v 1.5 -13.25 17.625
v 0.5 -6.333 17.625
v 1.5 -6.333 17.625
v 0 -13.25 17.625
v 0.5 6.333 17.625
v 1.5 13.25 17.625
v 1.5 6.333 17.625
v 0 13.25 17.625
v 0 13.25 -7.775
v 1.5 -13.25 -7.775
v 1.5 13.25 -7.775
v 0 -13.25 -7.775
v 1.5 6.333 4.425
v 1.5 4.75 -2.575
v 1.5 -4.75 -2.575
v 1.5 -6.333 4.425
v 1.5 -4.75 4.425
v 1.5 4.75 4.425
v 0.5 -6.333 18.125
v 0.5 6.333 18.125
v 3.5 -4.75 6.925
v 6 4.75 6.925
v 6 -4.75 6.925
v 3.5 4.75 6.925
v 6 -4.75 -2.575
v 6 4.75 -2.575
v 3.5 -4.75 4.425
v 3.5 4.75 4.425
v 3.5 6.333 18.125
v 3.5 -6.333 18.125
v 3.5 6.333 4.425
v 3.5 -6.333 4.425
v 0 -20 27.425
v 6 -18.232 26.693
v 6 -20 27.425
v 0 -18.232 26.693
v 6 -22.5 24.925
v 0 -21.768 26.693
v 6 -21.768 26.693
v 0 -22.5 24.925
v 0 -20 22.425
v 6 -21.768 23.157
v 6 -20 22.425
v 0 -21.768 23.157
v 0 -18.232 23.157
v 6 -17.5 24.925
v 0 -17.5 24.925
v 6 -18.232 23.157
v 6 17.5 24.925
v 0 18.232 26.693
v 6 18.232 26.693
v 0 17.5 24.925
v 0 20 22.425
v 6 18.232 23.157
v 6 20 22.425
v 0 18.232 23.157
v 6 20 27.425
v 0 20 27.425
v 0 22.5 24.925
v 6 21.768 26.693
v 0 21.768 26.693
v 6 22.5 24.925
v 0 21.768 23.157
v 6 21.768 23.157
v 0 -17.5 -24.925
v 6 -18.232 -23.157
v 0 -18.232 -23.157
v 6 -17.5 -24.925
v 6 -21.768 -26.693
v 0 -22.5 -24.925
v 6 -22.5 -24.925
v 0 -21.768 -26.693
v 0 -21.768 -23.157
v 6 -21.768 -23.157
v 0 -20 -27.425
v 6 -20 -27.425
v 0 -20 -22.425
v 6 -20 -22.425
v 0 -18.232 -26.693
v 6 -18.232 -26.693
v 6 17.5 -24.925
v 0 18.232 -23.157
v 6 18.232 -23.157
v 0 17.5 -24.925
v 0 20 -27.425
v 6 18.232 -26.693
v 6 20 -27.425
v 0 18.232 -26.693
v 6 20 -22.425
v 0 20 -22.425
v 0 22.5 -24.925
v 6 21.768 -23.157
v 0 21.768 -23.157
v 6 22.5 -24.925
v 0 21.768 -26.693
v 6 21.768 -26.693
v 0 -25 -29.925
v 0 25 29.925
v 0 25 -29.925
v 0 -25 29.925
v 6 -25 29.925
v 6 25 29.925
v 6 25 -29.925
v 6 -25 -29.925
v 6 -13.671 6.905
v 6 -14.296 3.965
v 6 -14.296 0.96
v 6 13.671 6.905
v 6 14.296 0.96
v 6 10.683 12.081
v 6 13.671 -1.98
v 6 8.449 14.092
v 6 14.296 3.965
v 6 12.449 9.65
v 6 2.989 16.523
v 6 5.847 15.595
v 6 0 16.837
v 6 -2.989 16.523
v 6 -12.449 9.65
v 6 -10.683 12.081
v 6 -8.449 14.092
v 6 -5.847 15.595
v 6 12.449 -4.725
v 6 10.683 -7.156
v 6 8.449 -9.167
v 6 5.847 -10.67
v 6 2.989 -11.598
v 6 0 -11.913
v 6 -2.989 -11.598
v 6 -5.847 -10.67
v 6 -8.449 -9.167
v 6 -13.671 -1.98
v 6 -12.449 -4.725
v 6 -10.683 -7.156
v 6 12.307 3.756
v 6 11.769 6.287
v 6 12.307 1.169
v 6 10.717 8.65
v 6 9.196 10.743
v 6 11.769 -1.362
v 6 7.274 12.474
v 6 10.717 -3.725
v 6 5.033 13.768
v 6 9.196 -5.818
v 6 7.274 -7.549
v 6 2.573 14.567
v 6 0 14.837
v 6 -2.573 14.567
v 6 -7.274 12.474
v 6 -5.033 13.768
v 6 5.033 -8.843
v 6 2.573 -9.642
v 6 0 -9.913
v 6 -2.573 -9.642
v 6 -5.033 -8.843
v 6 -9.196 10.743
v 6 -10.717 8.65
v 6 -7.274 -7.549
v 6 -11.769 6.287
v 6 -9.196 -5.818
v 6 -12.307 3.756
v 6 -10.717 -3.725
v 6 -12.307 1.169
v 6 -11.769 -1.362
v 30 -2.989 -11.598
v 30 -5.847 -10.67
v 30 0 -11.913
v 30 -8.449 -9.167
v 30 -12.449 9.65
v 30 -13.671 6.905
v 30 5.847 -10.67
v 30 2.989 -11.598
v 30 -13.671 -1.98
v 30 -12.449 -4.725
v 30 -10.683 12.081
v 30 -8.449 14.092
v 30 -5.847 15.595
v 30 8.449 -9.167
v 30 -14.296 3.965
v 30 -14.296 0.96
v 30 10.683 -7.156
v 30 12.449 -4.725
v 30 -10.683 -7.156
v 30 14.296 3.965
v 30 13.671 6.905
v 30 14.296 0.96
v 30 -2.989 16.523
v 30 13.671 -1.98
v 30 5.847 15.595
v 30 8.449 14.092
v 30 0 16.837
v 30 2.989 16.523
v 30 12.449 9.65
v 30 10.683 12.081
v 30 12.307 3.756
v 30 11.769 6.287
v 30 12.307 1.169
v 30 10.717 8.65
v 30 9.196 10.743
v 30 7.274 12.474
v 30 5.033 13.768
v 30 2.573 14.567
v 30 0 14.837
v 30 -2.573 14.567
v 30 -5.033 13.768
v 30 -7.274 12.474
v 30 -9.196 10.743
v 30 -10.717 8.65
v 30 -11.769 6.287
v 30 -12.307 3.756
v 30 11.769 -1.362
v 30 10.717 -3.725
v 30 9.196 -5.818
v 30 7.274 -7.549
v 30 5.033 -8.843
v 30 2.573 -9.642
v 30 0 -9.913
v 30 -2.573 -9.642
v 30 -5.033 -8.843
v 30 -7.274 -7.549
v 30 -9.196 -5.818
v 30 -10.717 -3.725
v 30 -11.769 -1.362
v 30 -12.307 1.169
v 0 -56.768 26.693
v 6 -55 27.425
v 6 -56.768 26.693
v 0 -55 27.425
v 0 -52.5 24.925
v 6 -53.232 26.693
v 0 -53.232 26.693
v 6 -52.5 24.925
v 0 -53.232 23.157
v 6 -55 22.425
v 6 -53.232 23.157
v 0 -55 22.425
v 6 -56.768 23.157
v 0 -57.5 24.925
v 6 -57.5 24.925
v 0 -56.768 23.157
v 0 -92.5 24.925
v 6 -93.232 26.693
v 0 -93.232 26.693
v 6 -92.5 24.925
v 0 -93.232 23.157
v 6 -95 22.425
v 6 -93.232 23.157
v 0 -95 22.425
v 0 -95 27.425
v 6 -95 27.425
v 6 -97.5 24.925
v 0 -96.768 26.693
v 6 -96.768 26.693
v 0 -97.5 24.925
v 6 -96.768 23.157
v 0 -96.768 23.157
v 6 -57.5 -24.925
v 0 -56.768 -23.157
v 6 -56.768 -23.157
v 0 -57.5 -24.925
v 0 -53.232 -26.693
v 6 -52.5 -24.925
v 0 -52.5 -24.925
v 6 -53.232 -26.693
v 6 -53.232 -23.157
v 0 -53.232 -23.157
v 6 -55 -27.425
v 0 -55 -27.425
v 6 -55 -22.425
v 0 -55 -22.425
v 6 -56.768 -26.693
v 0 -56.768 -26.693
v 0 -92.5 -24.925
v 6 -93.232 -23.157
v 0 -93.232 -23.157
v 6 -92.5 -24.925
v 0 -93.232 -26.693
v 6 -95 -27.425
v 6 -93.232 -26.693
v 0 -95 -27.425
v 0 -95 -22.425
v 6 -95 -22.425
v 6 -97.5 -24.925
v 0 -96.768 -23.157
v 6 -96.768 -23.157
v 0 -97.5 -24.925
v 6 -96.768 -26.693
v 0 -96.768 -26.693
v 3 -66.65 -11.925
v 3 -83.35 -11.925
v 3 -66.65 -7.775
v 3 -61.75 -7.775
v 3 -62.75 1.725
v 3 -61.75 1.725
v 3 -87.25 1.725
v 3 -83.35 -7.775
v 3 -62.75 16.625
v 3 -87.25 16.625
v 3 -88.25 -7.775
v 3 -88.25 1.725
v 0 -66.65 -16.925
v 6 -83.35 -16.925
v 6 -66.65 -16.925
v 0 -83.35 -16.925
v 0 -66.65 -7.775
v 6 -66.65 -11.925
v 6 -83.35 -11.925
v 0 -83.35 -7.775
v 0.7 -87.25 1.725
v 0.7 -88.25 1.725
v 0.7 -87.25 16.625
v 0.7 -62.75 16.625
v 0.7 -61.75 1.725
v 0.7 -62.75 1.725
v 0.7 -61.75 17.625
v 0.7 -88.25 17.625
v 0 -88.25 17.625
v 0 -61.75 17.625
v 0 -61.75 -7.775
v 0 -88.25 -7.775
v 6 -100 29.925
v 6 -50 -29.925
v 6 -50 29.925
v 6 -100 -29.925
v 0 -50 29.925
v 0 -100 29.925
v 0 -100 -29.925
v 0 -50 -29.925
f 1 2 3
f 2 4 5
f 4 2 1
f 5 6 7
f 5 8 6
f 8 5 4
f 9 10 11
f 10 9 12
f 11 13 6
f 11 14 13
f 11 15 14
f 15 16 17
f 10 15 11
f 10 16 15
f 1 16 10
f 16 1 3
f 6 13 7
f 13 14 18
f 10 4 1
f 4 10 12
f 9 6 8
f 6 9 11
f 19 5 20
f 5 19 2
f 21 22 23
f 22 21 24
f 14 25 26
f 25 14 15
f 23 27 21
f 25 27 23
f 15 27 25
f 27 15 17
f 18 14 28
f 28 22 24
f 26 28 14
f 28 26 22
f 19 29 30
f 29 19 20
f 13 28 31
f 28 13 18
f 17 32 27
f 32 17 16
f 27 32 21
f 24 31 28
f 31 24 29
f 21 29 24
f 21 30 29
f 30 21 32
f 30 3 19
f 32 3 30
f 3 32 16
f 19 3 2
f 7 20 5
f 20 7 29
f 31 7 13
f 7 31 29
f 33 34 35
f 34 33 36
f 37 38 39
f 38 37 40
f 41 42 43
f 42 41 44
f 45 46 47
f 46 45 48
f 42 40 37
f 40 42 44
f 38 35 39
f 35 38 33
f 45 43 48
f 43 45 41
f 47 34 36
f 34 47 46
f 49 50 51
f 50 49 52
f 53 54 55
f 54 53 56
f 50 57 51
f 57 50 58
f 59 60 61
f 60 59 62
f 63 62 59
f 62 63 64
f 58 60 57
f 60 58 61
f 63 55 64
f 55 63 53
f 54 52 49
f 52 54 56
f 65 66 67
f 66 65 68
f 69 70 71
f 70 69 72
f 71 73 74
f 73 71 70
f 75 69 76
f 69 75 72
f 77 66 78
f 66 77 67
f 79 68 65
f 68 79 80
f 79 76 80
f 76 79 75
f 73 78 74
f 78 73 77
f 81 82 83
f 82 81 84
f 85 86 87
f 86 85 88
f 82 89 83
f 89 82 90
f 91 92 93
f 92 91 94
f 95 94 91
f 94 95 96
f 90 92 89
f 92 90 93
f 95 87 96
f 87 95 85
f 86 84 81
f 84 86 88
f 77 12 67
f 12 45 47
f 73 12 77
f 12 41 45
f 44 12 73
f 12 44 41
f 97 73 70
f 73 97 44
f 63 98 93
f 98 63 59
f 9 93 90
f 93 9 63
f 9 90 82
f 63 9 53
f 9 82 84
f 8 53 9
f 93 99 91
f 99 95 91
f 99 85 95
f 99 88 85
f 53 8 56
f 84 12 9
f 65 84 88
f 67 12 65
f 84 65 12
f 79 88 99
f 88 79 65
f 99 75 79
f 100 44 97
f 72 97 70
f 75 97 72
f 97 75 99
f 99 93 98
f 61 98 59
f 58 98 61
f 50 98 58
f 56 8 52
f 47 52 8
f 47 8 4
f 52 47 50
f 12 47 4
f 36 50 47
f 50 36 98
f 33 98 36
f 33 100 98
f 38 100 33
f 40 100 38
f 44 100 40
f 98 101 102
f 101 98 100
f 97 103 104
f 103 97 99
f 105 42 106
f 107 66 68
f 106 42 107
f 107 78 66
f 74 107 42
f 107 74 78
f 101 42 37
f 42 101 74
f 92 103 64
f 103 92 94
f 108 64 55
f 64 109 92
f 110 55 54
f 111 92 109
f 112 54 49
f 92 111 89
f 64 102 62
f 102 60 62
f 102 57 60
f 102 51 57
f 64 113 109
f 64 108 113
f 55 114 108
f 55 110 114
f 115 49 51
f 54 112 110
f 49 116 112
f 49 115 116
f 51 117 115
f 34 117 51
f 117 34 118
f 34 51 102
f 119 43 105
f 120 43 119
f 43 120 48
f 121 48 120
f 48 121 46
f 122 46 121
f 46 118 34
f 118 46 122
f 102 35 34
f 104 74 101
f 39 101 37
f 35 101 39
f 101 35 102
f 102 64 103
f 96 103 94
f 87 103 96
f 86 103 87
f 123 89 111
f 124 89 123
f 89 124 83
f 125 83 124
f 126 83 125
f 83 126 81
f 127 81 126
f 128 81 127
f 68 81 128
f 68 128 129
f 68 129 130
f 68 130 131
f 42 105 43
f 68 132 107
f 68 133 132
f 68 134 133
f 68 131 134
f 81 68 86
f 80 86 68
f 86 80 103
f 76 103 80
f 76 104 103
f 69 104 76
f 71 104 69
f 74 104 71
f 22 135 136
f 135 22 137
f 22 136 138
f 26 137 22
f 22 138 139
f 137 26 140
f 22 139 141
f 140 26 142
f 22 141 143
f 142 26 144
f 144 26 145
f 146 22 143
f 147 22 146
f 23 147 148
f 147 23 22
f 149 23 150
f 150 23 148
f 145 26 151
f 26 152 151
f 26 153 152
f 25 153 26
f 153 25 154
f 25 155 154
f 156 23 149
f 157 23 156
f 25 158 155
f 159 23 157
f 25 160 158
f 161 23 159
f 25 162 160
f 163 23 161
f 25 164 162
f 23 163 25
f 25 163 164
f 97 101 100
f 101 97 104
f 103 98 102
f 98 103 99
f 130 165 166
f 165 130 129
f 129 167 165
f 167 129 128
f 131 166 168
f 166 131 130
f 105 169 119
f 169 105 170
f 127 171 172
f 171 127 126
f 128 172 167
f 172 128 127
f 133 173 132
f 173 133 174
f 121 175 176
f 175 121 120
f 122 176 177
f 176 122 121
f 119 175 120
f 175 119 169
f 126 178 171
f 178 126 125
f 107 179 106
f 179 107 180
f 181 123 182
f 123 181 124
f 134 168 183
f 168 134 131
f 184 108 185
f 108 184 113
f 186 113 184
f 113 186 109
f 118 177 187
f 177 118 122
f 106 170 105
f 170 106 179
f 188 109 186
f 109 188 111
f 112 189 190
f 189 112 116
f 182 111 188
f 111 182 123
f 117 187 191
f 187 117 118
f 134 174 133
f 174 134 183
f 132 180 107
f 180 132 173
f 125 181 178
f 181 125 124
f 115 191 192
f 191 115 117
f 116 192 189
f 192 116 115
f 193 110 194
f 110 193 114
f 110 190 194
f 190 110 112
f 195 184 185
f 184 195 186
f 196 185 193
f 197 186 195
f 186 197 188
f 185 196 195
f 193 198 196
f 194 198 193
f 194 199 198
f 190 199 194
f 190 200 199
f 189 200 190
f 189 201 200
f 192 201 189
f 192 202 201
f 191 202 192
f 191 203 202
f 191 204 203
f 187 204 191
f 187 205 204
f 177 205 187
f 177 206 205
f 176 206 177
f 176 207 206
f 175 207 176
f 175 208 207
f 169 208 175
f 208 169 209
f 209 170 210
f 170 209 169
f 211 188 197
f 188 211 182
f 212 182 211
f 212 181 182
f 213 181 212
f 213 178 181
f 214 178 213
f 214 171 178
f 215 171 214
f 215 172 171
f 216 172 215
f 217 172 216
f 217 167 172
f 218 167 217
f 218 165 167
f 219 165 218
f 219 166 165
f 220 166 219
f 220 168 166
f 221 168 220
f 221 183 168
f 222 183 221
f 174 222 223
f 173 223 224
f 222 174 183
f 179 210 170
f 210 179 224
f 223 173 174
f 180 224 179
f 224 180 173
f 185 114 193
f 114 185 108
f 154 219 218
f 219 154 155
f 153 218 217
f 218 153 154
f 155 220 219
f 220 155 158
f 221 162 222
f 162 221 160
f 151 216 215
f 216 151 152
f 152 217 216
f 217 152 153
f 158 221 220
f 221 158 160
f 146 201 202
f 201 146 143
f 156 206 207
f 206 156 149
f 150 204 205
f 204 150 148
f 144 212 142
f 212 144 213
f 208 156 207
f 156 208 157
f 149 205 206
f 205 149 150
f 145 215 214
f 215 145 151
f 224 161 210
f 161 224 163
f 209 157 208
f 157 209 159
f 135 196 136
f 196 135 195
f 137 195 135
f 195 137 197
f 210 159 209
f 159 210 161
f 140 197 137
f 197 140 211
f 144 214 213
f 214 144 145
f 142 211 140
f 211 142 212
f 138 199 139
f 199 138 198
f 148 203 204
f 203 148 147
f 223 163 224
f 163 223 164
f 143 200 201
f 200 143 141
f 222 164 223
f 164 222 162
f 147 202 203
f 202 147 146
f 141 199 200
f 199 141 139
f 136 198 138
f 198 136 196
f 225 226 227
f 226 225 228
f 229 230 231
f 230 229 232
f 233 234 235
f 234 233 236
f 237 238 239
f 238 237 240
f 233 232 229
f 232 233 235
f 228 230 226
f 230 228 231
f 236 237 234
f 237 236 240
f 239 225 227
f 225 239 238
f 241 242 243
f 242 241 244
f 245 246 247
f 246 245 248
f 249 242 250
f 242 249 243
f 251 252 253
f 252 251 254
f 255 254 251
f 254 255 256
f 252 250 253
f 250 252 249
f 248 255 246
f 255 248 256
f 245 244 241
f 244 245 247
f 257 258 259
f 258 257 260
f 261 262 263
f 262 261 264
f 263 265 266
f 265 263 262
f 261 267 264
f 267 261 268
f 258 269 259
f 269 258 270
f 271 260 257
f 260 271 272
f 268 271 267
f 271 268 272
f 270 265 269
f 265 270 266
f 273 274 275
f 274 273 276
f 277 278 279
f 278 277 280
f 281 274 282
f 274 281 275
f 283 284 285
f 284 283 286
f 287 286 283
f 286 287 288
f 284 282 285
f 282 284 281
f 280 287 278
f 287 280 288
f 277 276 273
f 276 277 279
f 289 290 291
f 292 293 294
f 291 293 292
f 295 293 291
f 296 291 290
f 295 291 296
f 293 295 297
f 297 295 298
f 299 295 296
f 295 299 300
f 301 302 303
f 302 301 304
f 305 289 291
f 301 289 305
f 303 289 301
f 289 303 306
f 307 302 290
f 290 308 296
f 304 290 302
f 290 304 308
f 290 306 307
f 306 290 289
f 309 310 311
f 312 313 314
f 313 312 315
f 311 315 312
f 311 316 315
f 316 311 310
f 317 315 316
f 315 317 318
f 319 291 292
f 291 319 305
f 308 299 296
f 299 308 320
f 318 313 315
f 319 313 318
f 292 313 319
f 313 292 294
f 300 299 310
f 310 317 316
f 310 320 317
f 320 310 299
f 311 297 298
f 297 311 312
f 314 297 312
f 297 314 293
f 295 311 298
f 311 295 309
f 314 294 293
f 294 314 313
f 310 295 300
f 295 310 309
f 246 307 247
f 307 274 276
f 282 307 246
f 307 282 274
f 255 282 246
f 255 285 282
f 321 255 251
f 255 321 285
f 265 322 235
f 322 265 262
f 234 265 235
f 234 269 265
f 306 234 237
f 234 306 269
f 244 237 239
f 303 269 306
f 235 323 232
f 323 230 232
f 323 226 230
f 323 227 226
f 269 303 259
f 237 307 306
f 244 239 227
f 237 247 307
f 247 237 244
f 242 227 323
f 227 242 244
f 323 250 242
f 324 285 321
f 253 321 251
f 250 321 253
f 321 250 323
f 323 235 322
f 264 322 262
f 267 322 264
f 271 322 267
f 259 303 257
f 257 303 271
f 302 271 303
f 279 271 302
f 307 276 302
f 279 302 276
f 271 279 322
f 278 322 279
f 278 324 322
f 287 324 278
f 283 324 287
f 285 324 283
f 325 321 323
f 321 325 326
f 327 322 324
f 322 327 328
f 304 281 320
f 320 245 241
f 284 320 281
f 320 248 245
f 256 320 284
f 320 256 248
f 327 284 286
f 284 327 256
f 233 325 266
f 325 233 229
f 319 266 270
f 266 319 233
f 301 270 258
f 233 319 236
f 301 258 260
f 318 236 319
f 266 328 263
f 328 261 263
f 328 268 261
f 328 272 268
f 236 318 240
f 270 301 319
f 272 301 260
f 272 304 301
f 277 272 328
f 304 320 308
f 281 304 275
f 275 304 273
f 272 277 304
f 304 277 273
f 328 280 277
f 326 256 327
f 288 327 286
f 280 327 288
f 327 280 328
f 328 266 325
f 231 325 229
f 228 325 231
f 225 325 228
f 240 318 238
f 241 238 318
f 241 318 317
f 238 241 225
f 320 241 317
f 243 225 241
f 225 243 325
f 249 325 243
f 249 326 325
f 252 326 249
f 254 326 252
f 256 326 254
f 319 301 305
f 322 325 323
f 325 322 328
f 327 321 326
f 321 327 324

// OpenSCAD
// file: PiCameraMount.scad
/*
 * openSCAD for a simple mount for the Raspberry PI Camera Module
 *
 * This file is not for standalone use - it's included in to another
 * openSCAN file for including in to another model.
 *
 * Copyright 2015 Peter T Mount
 * 
 * Licensed under the Apache License, Version 2.0 (the "License");
 * you may not use this file except in compliance with the License.
 * You may obtain a copy of the License at
 * 
 * http://www.apache.org/licenses/LICENSE-2.0
 * 
 * Unless required by applicable law or agreed to in writing, software
 * distributed under the License is distributed on an "AS IS" BASIS,
 * WITHOUT WARRANTIES OR CONDITIONS OF ANY KIND, either express or implied.
 * See the License for the specific language governing permissions and
 * limitations under the License.
 *
 */

// Uncomment this line to render/print just the holder as-is.
// Leave it commented out so that this file can be included in other modules
//piCameraStandalone(50);

/*
 * Measured dimensions of a PI Camera Module.
 *
 * These are based on actual measurements and those manually measured by Gert van Loo
 * and published on Scribd:
 *
 *		http://www.scribd.com/doc/142718448/Raspberry-Pi-Camera-Mechanical-Data
 *
 * Width & Depth are the exterior dimensions, width being the edge with the ribbon.
 *
 * We add 1.5 to these to give some room and account for the printer as it seems
 * to give a better fit.
 *
 * y offset is the height from the bottom of the center of the camera lens.
 *
 * ribbon width is just that, if required
 */
piCameraWidth=25 +1.5;
piCameraDepth=23.9 +1.5;
piCameraRibbonWidth=16.2 +0.5;
piCameraLensSize=8 +1.5;
piCameraYOffset=5.1+(piCameraLensSize/2);

/*
 * Module to render a PI camera mount.
 *
 * To use translate it into the required position so that the camera lens
 * is at the origin & pointing along the x axis.
 *
 * Then call piCameraMount(radius,mode)
 *
 * Where:
 *		width	the width of the component
 *		mode	The mode of the render
 *
 * The width must be >30mm as it's used to include the mounting hardware.
 * However you can enlarge it.
 *
 * The mode defines how it's rendered:
 *		0	Render the front panel
 *		1	Render the back panel
 *		2	Render a plain panel with just the mounting holes
 *    3	As 1 but cable exit on back is internal rather than at the bottom of the plate
 */

module piCamera(width,mode) {
	assign(
		tubeRadius=width/2,
		piCameraLensHalf=piCameraLensSize/2,
		piCameraWHalf=piCameraWidth/2,
		piCameraDHalf=piCameraDepth/2,
		offset=piCameraYOffset
	) {
		translate([0,0,piCameraYOffset/2]) union() {
			// Front panel
			difference() {
				if(mode==1 || mode==3)
					translate([6,-tubeRadius,-tubeRadius-offset]) cube([6,width,width+offset]);
				else
					translate([0,-tubeRadius,-tubeRadius-offset]) cube([6,width,width+offset]);

//				translate([4,-tubeRadius-1,-tubeRadius-offset-1]) cube([2,width+2,width+offset+2]);

				if(mode!=2) {
					// Holder for the pi camera module
					translate([4.5,-piCameraWHalf,-piCameraDHalf])
						cube([2.2,piCameraWidth,piCameraDepth]);

					// Holder for components on rear of module
					translate([6,1-piCameraWHalf,1-piCameraDHalf])
						cube([3,piCameraWidth-2,piCameraDepth-2]);
					translate([6,-piCameraWHalf,-piCameraDHalf])
						cube([3,piCameraWidth,9.5]);

					// Hole for the camera lens
					translate([-0.5,-piCameraLensHalf,2-piCameraLensSize])
						cube([6,piCameraLensSize,piCameraLensSize]);

					// Indent for ribbon holder on front of the module
					translate([2.5,-piCameraLensSize*2/3,-0.5])
						cube([3,piCameraLensSize*4/3,piCameraDHalf+1]);
		
					// Space for ribbon cable
					if(mode==1)
						translate([ 5, -piCameraRibbonWidth/2,-tubeRadius-1-offset])
							cube([3,piCameraRibbonWidth,tubeRadius+1+offset]);
					else if(mode==3) {
						translate([ 5, -piCameraRibbonWidth/2,14-tubeRadius-1-offset])
							cube([4,piCameraRibbonWidth,15]);
						translate([ 5, -piCameraRibbonWidth/2,14-tubeRadius-1-offset])
							cube([10,piCameraRibbonWidth,5]);
					}
				}

				// M4 mounting holes
				piCameraHoles(width,15);
			}
		}

	}
}

module piCameraHoles(width,h) {
	assign(tubeRadius=width/2) {
		for(h=[0:3])
			translate([-1,
				(h%2) ? (-tubeRadius+5) : (tubeRadius-5),
				(floor(h/2)) ? (-tubeRadius+5-piCameraYOffset) : (tubeRadius-5)
			])
			rotate([0,90,0])
			cylinder(h=15,r=2.5);
	}
}

/*
 * Standalone, generate a model of just the camera module with the specified radius
 */
module piCameraStandalone(radius) {
	translate([6,0,0]) rotate([0,0,180]) piCamera(radius,0);
	translate([-6,-radius*3/2,0]) piCamera(radius,3);
}
// file: Common.scad
/*
 * openSCAD Common features
 *
 * This file is not for standalone use - it's included in to another
 * openSCAN file for including in to another model.
 *
 * Copyright 2015 Peter T Mount
 * 
 * Licensed under the Apache License, Version 2.0 (the "License");
 * you may not use this file except in compliance with the License.
 * You may obtain a copy of the License at
 * 
 * http://www.apache.org/licenses/LICENSE-2.0
 * 
 * Unless required by applicable law or agreed to in writing, software
 * distributed under the License is distributed on an "AS IS" BASIS,
 * WITHOUT WARRANTIES OR CONDITIONS OF ANY KIND, either express or implied.
 * See the License for the specific language governing permissions and
 * limitations under the License.
 *
 */

/*
 * Bolt sizes - these are for the holes hence +0.25mm, measurements in radius
 */
M4=2.25;
M5=2.75;
M6=3.25;
// main file
/*
 * openSCAD for an adapter for attaching the Raspberry PI Camera Module 
 * to a telescope.
 *
 * This model comes in two parts, the eyepiece mount which attaches directly
 * to the telescope (no eyepiece required) and the back plate.
 *
 * However it's intended that the backplate be incorporated into another model
 * so that the PI itself is mounted with the camera.
 *
 * Copyright 2015 Peter T Mount
 * 
 * Licensed under the Apache License, Version 2.0 (the "License");
 * you may not use this file except in compliance with the License.
 * You may obtain a copy of the License at
 * 
 * http://www.apache.org/licenses/LICENSE-2.0
 * 
 * Unless required by applicable law or agreed to in writing, software
 * distributed under the License is distributed on an "AS IS" BASIS,
 * WITHOUT WARRANTIES OR CONDITIONS OF ANY KIND, either express or implied.
 * See the License for the specific language governing permissions and
 * limitations under the License.
 *
 */

// Include the telescope mount in the model
includeFront=1;

// Include the backplate in the model
includeBack=1;

// The required eyepiece diameter in inches.
// Most telescopes these days are 1.25"
eyepiece=1.25;
// Some big scopes have 2" barrels
//eyepiece=2;
// Older ones have 0.925" barrels
//eyepiece=0.925;

// ======================================================================
// Do not modify these

include <Common.scad>
include <PiCameraMount.scad>

// eyepiece diameter, adjusting for extruder diameter
eyediam=(eyepiece*25.4)-3;
eyerad=eyediam/2;
width=max(50,eyediam+10);

// **********************************************************************
if(includeFront&&includeBack) {
	translate([6,0,0]) rotate([0,0,180]) front();
	translate([-6,-width*3/2,0]) back();
}
else if(includeFront) front();
else if(includeBack) back();

// **********************************************************************

module front() {
	union() {
		piCamera(width,0);
		translate([-24,0,piCameraYOffset/4]) rotate([0,90,0]) difference() {
			cylinder( h=24,r=eyerad);
			translate([0,0,-2]) cylinder( h=27,r=eyerad-2);
		}
	}
}

module back() {
	piCamera(width,3);
}
